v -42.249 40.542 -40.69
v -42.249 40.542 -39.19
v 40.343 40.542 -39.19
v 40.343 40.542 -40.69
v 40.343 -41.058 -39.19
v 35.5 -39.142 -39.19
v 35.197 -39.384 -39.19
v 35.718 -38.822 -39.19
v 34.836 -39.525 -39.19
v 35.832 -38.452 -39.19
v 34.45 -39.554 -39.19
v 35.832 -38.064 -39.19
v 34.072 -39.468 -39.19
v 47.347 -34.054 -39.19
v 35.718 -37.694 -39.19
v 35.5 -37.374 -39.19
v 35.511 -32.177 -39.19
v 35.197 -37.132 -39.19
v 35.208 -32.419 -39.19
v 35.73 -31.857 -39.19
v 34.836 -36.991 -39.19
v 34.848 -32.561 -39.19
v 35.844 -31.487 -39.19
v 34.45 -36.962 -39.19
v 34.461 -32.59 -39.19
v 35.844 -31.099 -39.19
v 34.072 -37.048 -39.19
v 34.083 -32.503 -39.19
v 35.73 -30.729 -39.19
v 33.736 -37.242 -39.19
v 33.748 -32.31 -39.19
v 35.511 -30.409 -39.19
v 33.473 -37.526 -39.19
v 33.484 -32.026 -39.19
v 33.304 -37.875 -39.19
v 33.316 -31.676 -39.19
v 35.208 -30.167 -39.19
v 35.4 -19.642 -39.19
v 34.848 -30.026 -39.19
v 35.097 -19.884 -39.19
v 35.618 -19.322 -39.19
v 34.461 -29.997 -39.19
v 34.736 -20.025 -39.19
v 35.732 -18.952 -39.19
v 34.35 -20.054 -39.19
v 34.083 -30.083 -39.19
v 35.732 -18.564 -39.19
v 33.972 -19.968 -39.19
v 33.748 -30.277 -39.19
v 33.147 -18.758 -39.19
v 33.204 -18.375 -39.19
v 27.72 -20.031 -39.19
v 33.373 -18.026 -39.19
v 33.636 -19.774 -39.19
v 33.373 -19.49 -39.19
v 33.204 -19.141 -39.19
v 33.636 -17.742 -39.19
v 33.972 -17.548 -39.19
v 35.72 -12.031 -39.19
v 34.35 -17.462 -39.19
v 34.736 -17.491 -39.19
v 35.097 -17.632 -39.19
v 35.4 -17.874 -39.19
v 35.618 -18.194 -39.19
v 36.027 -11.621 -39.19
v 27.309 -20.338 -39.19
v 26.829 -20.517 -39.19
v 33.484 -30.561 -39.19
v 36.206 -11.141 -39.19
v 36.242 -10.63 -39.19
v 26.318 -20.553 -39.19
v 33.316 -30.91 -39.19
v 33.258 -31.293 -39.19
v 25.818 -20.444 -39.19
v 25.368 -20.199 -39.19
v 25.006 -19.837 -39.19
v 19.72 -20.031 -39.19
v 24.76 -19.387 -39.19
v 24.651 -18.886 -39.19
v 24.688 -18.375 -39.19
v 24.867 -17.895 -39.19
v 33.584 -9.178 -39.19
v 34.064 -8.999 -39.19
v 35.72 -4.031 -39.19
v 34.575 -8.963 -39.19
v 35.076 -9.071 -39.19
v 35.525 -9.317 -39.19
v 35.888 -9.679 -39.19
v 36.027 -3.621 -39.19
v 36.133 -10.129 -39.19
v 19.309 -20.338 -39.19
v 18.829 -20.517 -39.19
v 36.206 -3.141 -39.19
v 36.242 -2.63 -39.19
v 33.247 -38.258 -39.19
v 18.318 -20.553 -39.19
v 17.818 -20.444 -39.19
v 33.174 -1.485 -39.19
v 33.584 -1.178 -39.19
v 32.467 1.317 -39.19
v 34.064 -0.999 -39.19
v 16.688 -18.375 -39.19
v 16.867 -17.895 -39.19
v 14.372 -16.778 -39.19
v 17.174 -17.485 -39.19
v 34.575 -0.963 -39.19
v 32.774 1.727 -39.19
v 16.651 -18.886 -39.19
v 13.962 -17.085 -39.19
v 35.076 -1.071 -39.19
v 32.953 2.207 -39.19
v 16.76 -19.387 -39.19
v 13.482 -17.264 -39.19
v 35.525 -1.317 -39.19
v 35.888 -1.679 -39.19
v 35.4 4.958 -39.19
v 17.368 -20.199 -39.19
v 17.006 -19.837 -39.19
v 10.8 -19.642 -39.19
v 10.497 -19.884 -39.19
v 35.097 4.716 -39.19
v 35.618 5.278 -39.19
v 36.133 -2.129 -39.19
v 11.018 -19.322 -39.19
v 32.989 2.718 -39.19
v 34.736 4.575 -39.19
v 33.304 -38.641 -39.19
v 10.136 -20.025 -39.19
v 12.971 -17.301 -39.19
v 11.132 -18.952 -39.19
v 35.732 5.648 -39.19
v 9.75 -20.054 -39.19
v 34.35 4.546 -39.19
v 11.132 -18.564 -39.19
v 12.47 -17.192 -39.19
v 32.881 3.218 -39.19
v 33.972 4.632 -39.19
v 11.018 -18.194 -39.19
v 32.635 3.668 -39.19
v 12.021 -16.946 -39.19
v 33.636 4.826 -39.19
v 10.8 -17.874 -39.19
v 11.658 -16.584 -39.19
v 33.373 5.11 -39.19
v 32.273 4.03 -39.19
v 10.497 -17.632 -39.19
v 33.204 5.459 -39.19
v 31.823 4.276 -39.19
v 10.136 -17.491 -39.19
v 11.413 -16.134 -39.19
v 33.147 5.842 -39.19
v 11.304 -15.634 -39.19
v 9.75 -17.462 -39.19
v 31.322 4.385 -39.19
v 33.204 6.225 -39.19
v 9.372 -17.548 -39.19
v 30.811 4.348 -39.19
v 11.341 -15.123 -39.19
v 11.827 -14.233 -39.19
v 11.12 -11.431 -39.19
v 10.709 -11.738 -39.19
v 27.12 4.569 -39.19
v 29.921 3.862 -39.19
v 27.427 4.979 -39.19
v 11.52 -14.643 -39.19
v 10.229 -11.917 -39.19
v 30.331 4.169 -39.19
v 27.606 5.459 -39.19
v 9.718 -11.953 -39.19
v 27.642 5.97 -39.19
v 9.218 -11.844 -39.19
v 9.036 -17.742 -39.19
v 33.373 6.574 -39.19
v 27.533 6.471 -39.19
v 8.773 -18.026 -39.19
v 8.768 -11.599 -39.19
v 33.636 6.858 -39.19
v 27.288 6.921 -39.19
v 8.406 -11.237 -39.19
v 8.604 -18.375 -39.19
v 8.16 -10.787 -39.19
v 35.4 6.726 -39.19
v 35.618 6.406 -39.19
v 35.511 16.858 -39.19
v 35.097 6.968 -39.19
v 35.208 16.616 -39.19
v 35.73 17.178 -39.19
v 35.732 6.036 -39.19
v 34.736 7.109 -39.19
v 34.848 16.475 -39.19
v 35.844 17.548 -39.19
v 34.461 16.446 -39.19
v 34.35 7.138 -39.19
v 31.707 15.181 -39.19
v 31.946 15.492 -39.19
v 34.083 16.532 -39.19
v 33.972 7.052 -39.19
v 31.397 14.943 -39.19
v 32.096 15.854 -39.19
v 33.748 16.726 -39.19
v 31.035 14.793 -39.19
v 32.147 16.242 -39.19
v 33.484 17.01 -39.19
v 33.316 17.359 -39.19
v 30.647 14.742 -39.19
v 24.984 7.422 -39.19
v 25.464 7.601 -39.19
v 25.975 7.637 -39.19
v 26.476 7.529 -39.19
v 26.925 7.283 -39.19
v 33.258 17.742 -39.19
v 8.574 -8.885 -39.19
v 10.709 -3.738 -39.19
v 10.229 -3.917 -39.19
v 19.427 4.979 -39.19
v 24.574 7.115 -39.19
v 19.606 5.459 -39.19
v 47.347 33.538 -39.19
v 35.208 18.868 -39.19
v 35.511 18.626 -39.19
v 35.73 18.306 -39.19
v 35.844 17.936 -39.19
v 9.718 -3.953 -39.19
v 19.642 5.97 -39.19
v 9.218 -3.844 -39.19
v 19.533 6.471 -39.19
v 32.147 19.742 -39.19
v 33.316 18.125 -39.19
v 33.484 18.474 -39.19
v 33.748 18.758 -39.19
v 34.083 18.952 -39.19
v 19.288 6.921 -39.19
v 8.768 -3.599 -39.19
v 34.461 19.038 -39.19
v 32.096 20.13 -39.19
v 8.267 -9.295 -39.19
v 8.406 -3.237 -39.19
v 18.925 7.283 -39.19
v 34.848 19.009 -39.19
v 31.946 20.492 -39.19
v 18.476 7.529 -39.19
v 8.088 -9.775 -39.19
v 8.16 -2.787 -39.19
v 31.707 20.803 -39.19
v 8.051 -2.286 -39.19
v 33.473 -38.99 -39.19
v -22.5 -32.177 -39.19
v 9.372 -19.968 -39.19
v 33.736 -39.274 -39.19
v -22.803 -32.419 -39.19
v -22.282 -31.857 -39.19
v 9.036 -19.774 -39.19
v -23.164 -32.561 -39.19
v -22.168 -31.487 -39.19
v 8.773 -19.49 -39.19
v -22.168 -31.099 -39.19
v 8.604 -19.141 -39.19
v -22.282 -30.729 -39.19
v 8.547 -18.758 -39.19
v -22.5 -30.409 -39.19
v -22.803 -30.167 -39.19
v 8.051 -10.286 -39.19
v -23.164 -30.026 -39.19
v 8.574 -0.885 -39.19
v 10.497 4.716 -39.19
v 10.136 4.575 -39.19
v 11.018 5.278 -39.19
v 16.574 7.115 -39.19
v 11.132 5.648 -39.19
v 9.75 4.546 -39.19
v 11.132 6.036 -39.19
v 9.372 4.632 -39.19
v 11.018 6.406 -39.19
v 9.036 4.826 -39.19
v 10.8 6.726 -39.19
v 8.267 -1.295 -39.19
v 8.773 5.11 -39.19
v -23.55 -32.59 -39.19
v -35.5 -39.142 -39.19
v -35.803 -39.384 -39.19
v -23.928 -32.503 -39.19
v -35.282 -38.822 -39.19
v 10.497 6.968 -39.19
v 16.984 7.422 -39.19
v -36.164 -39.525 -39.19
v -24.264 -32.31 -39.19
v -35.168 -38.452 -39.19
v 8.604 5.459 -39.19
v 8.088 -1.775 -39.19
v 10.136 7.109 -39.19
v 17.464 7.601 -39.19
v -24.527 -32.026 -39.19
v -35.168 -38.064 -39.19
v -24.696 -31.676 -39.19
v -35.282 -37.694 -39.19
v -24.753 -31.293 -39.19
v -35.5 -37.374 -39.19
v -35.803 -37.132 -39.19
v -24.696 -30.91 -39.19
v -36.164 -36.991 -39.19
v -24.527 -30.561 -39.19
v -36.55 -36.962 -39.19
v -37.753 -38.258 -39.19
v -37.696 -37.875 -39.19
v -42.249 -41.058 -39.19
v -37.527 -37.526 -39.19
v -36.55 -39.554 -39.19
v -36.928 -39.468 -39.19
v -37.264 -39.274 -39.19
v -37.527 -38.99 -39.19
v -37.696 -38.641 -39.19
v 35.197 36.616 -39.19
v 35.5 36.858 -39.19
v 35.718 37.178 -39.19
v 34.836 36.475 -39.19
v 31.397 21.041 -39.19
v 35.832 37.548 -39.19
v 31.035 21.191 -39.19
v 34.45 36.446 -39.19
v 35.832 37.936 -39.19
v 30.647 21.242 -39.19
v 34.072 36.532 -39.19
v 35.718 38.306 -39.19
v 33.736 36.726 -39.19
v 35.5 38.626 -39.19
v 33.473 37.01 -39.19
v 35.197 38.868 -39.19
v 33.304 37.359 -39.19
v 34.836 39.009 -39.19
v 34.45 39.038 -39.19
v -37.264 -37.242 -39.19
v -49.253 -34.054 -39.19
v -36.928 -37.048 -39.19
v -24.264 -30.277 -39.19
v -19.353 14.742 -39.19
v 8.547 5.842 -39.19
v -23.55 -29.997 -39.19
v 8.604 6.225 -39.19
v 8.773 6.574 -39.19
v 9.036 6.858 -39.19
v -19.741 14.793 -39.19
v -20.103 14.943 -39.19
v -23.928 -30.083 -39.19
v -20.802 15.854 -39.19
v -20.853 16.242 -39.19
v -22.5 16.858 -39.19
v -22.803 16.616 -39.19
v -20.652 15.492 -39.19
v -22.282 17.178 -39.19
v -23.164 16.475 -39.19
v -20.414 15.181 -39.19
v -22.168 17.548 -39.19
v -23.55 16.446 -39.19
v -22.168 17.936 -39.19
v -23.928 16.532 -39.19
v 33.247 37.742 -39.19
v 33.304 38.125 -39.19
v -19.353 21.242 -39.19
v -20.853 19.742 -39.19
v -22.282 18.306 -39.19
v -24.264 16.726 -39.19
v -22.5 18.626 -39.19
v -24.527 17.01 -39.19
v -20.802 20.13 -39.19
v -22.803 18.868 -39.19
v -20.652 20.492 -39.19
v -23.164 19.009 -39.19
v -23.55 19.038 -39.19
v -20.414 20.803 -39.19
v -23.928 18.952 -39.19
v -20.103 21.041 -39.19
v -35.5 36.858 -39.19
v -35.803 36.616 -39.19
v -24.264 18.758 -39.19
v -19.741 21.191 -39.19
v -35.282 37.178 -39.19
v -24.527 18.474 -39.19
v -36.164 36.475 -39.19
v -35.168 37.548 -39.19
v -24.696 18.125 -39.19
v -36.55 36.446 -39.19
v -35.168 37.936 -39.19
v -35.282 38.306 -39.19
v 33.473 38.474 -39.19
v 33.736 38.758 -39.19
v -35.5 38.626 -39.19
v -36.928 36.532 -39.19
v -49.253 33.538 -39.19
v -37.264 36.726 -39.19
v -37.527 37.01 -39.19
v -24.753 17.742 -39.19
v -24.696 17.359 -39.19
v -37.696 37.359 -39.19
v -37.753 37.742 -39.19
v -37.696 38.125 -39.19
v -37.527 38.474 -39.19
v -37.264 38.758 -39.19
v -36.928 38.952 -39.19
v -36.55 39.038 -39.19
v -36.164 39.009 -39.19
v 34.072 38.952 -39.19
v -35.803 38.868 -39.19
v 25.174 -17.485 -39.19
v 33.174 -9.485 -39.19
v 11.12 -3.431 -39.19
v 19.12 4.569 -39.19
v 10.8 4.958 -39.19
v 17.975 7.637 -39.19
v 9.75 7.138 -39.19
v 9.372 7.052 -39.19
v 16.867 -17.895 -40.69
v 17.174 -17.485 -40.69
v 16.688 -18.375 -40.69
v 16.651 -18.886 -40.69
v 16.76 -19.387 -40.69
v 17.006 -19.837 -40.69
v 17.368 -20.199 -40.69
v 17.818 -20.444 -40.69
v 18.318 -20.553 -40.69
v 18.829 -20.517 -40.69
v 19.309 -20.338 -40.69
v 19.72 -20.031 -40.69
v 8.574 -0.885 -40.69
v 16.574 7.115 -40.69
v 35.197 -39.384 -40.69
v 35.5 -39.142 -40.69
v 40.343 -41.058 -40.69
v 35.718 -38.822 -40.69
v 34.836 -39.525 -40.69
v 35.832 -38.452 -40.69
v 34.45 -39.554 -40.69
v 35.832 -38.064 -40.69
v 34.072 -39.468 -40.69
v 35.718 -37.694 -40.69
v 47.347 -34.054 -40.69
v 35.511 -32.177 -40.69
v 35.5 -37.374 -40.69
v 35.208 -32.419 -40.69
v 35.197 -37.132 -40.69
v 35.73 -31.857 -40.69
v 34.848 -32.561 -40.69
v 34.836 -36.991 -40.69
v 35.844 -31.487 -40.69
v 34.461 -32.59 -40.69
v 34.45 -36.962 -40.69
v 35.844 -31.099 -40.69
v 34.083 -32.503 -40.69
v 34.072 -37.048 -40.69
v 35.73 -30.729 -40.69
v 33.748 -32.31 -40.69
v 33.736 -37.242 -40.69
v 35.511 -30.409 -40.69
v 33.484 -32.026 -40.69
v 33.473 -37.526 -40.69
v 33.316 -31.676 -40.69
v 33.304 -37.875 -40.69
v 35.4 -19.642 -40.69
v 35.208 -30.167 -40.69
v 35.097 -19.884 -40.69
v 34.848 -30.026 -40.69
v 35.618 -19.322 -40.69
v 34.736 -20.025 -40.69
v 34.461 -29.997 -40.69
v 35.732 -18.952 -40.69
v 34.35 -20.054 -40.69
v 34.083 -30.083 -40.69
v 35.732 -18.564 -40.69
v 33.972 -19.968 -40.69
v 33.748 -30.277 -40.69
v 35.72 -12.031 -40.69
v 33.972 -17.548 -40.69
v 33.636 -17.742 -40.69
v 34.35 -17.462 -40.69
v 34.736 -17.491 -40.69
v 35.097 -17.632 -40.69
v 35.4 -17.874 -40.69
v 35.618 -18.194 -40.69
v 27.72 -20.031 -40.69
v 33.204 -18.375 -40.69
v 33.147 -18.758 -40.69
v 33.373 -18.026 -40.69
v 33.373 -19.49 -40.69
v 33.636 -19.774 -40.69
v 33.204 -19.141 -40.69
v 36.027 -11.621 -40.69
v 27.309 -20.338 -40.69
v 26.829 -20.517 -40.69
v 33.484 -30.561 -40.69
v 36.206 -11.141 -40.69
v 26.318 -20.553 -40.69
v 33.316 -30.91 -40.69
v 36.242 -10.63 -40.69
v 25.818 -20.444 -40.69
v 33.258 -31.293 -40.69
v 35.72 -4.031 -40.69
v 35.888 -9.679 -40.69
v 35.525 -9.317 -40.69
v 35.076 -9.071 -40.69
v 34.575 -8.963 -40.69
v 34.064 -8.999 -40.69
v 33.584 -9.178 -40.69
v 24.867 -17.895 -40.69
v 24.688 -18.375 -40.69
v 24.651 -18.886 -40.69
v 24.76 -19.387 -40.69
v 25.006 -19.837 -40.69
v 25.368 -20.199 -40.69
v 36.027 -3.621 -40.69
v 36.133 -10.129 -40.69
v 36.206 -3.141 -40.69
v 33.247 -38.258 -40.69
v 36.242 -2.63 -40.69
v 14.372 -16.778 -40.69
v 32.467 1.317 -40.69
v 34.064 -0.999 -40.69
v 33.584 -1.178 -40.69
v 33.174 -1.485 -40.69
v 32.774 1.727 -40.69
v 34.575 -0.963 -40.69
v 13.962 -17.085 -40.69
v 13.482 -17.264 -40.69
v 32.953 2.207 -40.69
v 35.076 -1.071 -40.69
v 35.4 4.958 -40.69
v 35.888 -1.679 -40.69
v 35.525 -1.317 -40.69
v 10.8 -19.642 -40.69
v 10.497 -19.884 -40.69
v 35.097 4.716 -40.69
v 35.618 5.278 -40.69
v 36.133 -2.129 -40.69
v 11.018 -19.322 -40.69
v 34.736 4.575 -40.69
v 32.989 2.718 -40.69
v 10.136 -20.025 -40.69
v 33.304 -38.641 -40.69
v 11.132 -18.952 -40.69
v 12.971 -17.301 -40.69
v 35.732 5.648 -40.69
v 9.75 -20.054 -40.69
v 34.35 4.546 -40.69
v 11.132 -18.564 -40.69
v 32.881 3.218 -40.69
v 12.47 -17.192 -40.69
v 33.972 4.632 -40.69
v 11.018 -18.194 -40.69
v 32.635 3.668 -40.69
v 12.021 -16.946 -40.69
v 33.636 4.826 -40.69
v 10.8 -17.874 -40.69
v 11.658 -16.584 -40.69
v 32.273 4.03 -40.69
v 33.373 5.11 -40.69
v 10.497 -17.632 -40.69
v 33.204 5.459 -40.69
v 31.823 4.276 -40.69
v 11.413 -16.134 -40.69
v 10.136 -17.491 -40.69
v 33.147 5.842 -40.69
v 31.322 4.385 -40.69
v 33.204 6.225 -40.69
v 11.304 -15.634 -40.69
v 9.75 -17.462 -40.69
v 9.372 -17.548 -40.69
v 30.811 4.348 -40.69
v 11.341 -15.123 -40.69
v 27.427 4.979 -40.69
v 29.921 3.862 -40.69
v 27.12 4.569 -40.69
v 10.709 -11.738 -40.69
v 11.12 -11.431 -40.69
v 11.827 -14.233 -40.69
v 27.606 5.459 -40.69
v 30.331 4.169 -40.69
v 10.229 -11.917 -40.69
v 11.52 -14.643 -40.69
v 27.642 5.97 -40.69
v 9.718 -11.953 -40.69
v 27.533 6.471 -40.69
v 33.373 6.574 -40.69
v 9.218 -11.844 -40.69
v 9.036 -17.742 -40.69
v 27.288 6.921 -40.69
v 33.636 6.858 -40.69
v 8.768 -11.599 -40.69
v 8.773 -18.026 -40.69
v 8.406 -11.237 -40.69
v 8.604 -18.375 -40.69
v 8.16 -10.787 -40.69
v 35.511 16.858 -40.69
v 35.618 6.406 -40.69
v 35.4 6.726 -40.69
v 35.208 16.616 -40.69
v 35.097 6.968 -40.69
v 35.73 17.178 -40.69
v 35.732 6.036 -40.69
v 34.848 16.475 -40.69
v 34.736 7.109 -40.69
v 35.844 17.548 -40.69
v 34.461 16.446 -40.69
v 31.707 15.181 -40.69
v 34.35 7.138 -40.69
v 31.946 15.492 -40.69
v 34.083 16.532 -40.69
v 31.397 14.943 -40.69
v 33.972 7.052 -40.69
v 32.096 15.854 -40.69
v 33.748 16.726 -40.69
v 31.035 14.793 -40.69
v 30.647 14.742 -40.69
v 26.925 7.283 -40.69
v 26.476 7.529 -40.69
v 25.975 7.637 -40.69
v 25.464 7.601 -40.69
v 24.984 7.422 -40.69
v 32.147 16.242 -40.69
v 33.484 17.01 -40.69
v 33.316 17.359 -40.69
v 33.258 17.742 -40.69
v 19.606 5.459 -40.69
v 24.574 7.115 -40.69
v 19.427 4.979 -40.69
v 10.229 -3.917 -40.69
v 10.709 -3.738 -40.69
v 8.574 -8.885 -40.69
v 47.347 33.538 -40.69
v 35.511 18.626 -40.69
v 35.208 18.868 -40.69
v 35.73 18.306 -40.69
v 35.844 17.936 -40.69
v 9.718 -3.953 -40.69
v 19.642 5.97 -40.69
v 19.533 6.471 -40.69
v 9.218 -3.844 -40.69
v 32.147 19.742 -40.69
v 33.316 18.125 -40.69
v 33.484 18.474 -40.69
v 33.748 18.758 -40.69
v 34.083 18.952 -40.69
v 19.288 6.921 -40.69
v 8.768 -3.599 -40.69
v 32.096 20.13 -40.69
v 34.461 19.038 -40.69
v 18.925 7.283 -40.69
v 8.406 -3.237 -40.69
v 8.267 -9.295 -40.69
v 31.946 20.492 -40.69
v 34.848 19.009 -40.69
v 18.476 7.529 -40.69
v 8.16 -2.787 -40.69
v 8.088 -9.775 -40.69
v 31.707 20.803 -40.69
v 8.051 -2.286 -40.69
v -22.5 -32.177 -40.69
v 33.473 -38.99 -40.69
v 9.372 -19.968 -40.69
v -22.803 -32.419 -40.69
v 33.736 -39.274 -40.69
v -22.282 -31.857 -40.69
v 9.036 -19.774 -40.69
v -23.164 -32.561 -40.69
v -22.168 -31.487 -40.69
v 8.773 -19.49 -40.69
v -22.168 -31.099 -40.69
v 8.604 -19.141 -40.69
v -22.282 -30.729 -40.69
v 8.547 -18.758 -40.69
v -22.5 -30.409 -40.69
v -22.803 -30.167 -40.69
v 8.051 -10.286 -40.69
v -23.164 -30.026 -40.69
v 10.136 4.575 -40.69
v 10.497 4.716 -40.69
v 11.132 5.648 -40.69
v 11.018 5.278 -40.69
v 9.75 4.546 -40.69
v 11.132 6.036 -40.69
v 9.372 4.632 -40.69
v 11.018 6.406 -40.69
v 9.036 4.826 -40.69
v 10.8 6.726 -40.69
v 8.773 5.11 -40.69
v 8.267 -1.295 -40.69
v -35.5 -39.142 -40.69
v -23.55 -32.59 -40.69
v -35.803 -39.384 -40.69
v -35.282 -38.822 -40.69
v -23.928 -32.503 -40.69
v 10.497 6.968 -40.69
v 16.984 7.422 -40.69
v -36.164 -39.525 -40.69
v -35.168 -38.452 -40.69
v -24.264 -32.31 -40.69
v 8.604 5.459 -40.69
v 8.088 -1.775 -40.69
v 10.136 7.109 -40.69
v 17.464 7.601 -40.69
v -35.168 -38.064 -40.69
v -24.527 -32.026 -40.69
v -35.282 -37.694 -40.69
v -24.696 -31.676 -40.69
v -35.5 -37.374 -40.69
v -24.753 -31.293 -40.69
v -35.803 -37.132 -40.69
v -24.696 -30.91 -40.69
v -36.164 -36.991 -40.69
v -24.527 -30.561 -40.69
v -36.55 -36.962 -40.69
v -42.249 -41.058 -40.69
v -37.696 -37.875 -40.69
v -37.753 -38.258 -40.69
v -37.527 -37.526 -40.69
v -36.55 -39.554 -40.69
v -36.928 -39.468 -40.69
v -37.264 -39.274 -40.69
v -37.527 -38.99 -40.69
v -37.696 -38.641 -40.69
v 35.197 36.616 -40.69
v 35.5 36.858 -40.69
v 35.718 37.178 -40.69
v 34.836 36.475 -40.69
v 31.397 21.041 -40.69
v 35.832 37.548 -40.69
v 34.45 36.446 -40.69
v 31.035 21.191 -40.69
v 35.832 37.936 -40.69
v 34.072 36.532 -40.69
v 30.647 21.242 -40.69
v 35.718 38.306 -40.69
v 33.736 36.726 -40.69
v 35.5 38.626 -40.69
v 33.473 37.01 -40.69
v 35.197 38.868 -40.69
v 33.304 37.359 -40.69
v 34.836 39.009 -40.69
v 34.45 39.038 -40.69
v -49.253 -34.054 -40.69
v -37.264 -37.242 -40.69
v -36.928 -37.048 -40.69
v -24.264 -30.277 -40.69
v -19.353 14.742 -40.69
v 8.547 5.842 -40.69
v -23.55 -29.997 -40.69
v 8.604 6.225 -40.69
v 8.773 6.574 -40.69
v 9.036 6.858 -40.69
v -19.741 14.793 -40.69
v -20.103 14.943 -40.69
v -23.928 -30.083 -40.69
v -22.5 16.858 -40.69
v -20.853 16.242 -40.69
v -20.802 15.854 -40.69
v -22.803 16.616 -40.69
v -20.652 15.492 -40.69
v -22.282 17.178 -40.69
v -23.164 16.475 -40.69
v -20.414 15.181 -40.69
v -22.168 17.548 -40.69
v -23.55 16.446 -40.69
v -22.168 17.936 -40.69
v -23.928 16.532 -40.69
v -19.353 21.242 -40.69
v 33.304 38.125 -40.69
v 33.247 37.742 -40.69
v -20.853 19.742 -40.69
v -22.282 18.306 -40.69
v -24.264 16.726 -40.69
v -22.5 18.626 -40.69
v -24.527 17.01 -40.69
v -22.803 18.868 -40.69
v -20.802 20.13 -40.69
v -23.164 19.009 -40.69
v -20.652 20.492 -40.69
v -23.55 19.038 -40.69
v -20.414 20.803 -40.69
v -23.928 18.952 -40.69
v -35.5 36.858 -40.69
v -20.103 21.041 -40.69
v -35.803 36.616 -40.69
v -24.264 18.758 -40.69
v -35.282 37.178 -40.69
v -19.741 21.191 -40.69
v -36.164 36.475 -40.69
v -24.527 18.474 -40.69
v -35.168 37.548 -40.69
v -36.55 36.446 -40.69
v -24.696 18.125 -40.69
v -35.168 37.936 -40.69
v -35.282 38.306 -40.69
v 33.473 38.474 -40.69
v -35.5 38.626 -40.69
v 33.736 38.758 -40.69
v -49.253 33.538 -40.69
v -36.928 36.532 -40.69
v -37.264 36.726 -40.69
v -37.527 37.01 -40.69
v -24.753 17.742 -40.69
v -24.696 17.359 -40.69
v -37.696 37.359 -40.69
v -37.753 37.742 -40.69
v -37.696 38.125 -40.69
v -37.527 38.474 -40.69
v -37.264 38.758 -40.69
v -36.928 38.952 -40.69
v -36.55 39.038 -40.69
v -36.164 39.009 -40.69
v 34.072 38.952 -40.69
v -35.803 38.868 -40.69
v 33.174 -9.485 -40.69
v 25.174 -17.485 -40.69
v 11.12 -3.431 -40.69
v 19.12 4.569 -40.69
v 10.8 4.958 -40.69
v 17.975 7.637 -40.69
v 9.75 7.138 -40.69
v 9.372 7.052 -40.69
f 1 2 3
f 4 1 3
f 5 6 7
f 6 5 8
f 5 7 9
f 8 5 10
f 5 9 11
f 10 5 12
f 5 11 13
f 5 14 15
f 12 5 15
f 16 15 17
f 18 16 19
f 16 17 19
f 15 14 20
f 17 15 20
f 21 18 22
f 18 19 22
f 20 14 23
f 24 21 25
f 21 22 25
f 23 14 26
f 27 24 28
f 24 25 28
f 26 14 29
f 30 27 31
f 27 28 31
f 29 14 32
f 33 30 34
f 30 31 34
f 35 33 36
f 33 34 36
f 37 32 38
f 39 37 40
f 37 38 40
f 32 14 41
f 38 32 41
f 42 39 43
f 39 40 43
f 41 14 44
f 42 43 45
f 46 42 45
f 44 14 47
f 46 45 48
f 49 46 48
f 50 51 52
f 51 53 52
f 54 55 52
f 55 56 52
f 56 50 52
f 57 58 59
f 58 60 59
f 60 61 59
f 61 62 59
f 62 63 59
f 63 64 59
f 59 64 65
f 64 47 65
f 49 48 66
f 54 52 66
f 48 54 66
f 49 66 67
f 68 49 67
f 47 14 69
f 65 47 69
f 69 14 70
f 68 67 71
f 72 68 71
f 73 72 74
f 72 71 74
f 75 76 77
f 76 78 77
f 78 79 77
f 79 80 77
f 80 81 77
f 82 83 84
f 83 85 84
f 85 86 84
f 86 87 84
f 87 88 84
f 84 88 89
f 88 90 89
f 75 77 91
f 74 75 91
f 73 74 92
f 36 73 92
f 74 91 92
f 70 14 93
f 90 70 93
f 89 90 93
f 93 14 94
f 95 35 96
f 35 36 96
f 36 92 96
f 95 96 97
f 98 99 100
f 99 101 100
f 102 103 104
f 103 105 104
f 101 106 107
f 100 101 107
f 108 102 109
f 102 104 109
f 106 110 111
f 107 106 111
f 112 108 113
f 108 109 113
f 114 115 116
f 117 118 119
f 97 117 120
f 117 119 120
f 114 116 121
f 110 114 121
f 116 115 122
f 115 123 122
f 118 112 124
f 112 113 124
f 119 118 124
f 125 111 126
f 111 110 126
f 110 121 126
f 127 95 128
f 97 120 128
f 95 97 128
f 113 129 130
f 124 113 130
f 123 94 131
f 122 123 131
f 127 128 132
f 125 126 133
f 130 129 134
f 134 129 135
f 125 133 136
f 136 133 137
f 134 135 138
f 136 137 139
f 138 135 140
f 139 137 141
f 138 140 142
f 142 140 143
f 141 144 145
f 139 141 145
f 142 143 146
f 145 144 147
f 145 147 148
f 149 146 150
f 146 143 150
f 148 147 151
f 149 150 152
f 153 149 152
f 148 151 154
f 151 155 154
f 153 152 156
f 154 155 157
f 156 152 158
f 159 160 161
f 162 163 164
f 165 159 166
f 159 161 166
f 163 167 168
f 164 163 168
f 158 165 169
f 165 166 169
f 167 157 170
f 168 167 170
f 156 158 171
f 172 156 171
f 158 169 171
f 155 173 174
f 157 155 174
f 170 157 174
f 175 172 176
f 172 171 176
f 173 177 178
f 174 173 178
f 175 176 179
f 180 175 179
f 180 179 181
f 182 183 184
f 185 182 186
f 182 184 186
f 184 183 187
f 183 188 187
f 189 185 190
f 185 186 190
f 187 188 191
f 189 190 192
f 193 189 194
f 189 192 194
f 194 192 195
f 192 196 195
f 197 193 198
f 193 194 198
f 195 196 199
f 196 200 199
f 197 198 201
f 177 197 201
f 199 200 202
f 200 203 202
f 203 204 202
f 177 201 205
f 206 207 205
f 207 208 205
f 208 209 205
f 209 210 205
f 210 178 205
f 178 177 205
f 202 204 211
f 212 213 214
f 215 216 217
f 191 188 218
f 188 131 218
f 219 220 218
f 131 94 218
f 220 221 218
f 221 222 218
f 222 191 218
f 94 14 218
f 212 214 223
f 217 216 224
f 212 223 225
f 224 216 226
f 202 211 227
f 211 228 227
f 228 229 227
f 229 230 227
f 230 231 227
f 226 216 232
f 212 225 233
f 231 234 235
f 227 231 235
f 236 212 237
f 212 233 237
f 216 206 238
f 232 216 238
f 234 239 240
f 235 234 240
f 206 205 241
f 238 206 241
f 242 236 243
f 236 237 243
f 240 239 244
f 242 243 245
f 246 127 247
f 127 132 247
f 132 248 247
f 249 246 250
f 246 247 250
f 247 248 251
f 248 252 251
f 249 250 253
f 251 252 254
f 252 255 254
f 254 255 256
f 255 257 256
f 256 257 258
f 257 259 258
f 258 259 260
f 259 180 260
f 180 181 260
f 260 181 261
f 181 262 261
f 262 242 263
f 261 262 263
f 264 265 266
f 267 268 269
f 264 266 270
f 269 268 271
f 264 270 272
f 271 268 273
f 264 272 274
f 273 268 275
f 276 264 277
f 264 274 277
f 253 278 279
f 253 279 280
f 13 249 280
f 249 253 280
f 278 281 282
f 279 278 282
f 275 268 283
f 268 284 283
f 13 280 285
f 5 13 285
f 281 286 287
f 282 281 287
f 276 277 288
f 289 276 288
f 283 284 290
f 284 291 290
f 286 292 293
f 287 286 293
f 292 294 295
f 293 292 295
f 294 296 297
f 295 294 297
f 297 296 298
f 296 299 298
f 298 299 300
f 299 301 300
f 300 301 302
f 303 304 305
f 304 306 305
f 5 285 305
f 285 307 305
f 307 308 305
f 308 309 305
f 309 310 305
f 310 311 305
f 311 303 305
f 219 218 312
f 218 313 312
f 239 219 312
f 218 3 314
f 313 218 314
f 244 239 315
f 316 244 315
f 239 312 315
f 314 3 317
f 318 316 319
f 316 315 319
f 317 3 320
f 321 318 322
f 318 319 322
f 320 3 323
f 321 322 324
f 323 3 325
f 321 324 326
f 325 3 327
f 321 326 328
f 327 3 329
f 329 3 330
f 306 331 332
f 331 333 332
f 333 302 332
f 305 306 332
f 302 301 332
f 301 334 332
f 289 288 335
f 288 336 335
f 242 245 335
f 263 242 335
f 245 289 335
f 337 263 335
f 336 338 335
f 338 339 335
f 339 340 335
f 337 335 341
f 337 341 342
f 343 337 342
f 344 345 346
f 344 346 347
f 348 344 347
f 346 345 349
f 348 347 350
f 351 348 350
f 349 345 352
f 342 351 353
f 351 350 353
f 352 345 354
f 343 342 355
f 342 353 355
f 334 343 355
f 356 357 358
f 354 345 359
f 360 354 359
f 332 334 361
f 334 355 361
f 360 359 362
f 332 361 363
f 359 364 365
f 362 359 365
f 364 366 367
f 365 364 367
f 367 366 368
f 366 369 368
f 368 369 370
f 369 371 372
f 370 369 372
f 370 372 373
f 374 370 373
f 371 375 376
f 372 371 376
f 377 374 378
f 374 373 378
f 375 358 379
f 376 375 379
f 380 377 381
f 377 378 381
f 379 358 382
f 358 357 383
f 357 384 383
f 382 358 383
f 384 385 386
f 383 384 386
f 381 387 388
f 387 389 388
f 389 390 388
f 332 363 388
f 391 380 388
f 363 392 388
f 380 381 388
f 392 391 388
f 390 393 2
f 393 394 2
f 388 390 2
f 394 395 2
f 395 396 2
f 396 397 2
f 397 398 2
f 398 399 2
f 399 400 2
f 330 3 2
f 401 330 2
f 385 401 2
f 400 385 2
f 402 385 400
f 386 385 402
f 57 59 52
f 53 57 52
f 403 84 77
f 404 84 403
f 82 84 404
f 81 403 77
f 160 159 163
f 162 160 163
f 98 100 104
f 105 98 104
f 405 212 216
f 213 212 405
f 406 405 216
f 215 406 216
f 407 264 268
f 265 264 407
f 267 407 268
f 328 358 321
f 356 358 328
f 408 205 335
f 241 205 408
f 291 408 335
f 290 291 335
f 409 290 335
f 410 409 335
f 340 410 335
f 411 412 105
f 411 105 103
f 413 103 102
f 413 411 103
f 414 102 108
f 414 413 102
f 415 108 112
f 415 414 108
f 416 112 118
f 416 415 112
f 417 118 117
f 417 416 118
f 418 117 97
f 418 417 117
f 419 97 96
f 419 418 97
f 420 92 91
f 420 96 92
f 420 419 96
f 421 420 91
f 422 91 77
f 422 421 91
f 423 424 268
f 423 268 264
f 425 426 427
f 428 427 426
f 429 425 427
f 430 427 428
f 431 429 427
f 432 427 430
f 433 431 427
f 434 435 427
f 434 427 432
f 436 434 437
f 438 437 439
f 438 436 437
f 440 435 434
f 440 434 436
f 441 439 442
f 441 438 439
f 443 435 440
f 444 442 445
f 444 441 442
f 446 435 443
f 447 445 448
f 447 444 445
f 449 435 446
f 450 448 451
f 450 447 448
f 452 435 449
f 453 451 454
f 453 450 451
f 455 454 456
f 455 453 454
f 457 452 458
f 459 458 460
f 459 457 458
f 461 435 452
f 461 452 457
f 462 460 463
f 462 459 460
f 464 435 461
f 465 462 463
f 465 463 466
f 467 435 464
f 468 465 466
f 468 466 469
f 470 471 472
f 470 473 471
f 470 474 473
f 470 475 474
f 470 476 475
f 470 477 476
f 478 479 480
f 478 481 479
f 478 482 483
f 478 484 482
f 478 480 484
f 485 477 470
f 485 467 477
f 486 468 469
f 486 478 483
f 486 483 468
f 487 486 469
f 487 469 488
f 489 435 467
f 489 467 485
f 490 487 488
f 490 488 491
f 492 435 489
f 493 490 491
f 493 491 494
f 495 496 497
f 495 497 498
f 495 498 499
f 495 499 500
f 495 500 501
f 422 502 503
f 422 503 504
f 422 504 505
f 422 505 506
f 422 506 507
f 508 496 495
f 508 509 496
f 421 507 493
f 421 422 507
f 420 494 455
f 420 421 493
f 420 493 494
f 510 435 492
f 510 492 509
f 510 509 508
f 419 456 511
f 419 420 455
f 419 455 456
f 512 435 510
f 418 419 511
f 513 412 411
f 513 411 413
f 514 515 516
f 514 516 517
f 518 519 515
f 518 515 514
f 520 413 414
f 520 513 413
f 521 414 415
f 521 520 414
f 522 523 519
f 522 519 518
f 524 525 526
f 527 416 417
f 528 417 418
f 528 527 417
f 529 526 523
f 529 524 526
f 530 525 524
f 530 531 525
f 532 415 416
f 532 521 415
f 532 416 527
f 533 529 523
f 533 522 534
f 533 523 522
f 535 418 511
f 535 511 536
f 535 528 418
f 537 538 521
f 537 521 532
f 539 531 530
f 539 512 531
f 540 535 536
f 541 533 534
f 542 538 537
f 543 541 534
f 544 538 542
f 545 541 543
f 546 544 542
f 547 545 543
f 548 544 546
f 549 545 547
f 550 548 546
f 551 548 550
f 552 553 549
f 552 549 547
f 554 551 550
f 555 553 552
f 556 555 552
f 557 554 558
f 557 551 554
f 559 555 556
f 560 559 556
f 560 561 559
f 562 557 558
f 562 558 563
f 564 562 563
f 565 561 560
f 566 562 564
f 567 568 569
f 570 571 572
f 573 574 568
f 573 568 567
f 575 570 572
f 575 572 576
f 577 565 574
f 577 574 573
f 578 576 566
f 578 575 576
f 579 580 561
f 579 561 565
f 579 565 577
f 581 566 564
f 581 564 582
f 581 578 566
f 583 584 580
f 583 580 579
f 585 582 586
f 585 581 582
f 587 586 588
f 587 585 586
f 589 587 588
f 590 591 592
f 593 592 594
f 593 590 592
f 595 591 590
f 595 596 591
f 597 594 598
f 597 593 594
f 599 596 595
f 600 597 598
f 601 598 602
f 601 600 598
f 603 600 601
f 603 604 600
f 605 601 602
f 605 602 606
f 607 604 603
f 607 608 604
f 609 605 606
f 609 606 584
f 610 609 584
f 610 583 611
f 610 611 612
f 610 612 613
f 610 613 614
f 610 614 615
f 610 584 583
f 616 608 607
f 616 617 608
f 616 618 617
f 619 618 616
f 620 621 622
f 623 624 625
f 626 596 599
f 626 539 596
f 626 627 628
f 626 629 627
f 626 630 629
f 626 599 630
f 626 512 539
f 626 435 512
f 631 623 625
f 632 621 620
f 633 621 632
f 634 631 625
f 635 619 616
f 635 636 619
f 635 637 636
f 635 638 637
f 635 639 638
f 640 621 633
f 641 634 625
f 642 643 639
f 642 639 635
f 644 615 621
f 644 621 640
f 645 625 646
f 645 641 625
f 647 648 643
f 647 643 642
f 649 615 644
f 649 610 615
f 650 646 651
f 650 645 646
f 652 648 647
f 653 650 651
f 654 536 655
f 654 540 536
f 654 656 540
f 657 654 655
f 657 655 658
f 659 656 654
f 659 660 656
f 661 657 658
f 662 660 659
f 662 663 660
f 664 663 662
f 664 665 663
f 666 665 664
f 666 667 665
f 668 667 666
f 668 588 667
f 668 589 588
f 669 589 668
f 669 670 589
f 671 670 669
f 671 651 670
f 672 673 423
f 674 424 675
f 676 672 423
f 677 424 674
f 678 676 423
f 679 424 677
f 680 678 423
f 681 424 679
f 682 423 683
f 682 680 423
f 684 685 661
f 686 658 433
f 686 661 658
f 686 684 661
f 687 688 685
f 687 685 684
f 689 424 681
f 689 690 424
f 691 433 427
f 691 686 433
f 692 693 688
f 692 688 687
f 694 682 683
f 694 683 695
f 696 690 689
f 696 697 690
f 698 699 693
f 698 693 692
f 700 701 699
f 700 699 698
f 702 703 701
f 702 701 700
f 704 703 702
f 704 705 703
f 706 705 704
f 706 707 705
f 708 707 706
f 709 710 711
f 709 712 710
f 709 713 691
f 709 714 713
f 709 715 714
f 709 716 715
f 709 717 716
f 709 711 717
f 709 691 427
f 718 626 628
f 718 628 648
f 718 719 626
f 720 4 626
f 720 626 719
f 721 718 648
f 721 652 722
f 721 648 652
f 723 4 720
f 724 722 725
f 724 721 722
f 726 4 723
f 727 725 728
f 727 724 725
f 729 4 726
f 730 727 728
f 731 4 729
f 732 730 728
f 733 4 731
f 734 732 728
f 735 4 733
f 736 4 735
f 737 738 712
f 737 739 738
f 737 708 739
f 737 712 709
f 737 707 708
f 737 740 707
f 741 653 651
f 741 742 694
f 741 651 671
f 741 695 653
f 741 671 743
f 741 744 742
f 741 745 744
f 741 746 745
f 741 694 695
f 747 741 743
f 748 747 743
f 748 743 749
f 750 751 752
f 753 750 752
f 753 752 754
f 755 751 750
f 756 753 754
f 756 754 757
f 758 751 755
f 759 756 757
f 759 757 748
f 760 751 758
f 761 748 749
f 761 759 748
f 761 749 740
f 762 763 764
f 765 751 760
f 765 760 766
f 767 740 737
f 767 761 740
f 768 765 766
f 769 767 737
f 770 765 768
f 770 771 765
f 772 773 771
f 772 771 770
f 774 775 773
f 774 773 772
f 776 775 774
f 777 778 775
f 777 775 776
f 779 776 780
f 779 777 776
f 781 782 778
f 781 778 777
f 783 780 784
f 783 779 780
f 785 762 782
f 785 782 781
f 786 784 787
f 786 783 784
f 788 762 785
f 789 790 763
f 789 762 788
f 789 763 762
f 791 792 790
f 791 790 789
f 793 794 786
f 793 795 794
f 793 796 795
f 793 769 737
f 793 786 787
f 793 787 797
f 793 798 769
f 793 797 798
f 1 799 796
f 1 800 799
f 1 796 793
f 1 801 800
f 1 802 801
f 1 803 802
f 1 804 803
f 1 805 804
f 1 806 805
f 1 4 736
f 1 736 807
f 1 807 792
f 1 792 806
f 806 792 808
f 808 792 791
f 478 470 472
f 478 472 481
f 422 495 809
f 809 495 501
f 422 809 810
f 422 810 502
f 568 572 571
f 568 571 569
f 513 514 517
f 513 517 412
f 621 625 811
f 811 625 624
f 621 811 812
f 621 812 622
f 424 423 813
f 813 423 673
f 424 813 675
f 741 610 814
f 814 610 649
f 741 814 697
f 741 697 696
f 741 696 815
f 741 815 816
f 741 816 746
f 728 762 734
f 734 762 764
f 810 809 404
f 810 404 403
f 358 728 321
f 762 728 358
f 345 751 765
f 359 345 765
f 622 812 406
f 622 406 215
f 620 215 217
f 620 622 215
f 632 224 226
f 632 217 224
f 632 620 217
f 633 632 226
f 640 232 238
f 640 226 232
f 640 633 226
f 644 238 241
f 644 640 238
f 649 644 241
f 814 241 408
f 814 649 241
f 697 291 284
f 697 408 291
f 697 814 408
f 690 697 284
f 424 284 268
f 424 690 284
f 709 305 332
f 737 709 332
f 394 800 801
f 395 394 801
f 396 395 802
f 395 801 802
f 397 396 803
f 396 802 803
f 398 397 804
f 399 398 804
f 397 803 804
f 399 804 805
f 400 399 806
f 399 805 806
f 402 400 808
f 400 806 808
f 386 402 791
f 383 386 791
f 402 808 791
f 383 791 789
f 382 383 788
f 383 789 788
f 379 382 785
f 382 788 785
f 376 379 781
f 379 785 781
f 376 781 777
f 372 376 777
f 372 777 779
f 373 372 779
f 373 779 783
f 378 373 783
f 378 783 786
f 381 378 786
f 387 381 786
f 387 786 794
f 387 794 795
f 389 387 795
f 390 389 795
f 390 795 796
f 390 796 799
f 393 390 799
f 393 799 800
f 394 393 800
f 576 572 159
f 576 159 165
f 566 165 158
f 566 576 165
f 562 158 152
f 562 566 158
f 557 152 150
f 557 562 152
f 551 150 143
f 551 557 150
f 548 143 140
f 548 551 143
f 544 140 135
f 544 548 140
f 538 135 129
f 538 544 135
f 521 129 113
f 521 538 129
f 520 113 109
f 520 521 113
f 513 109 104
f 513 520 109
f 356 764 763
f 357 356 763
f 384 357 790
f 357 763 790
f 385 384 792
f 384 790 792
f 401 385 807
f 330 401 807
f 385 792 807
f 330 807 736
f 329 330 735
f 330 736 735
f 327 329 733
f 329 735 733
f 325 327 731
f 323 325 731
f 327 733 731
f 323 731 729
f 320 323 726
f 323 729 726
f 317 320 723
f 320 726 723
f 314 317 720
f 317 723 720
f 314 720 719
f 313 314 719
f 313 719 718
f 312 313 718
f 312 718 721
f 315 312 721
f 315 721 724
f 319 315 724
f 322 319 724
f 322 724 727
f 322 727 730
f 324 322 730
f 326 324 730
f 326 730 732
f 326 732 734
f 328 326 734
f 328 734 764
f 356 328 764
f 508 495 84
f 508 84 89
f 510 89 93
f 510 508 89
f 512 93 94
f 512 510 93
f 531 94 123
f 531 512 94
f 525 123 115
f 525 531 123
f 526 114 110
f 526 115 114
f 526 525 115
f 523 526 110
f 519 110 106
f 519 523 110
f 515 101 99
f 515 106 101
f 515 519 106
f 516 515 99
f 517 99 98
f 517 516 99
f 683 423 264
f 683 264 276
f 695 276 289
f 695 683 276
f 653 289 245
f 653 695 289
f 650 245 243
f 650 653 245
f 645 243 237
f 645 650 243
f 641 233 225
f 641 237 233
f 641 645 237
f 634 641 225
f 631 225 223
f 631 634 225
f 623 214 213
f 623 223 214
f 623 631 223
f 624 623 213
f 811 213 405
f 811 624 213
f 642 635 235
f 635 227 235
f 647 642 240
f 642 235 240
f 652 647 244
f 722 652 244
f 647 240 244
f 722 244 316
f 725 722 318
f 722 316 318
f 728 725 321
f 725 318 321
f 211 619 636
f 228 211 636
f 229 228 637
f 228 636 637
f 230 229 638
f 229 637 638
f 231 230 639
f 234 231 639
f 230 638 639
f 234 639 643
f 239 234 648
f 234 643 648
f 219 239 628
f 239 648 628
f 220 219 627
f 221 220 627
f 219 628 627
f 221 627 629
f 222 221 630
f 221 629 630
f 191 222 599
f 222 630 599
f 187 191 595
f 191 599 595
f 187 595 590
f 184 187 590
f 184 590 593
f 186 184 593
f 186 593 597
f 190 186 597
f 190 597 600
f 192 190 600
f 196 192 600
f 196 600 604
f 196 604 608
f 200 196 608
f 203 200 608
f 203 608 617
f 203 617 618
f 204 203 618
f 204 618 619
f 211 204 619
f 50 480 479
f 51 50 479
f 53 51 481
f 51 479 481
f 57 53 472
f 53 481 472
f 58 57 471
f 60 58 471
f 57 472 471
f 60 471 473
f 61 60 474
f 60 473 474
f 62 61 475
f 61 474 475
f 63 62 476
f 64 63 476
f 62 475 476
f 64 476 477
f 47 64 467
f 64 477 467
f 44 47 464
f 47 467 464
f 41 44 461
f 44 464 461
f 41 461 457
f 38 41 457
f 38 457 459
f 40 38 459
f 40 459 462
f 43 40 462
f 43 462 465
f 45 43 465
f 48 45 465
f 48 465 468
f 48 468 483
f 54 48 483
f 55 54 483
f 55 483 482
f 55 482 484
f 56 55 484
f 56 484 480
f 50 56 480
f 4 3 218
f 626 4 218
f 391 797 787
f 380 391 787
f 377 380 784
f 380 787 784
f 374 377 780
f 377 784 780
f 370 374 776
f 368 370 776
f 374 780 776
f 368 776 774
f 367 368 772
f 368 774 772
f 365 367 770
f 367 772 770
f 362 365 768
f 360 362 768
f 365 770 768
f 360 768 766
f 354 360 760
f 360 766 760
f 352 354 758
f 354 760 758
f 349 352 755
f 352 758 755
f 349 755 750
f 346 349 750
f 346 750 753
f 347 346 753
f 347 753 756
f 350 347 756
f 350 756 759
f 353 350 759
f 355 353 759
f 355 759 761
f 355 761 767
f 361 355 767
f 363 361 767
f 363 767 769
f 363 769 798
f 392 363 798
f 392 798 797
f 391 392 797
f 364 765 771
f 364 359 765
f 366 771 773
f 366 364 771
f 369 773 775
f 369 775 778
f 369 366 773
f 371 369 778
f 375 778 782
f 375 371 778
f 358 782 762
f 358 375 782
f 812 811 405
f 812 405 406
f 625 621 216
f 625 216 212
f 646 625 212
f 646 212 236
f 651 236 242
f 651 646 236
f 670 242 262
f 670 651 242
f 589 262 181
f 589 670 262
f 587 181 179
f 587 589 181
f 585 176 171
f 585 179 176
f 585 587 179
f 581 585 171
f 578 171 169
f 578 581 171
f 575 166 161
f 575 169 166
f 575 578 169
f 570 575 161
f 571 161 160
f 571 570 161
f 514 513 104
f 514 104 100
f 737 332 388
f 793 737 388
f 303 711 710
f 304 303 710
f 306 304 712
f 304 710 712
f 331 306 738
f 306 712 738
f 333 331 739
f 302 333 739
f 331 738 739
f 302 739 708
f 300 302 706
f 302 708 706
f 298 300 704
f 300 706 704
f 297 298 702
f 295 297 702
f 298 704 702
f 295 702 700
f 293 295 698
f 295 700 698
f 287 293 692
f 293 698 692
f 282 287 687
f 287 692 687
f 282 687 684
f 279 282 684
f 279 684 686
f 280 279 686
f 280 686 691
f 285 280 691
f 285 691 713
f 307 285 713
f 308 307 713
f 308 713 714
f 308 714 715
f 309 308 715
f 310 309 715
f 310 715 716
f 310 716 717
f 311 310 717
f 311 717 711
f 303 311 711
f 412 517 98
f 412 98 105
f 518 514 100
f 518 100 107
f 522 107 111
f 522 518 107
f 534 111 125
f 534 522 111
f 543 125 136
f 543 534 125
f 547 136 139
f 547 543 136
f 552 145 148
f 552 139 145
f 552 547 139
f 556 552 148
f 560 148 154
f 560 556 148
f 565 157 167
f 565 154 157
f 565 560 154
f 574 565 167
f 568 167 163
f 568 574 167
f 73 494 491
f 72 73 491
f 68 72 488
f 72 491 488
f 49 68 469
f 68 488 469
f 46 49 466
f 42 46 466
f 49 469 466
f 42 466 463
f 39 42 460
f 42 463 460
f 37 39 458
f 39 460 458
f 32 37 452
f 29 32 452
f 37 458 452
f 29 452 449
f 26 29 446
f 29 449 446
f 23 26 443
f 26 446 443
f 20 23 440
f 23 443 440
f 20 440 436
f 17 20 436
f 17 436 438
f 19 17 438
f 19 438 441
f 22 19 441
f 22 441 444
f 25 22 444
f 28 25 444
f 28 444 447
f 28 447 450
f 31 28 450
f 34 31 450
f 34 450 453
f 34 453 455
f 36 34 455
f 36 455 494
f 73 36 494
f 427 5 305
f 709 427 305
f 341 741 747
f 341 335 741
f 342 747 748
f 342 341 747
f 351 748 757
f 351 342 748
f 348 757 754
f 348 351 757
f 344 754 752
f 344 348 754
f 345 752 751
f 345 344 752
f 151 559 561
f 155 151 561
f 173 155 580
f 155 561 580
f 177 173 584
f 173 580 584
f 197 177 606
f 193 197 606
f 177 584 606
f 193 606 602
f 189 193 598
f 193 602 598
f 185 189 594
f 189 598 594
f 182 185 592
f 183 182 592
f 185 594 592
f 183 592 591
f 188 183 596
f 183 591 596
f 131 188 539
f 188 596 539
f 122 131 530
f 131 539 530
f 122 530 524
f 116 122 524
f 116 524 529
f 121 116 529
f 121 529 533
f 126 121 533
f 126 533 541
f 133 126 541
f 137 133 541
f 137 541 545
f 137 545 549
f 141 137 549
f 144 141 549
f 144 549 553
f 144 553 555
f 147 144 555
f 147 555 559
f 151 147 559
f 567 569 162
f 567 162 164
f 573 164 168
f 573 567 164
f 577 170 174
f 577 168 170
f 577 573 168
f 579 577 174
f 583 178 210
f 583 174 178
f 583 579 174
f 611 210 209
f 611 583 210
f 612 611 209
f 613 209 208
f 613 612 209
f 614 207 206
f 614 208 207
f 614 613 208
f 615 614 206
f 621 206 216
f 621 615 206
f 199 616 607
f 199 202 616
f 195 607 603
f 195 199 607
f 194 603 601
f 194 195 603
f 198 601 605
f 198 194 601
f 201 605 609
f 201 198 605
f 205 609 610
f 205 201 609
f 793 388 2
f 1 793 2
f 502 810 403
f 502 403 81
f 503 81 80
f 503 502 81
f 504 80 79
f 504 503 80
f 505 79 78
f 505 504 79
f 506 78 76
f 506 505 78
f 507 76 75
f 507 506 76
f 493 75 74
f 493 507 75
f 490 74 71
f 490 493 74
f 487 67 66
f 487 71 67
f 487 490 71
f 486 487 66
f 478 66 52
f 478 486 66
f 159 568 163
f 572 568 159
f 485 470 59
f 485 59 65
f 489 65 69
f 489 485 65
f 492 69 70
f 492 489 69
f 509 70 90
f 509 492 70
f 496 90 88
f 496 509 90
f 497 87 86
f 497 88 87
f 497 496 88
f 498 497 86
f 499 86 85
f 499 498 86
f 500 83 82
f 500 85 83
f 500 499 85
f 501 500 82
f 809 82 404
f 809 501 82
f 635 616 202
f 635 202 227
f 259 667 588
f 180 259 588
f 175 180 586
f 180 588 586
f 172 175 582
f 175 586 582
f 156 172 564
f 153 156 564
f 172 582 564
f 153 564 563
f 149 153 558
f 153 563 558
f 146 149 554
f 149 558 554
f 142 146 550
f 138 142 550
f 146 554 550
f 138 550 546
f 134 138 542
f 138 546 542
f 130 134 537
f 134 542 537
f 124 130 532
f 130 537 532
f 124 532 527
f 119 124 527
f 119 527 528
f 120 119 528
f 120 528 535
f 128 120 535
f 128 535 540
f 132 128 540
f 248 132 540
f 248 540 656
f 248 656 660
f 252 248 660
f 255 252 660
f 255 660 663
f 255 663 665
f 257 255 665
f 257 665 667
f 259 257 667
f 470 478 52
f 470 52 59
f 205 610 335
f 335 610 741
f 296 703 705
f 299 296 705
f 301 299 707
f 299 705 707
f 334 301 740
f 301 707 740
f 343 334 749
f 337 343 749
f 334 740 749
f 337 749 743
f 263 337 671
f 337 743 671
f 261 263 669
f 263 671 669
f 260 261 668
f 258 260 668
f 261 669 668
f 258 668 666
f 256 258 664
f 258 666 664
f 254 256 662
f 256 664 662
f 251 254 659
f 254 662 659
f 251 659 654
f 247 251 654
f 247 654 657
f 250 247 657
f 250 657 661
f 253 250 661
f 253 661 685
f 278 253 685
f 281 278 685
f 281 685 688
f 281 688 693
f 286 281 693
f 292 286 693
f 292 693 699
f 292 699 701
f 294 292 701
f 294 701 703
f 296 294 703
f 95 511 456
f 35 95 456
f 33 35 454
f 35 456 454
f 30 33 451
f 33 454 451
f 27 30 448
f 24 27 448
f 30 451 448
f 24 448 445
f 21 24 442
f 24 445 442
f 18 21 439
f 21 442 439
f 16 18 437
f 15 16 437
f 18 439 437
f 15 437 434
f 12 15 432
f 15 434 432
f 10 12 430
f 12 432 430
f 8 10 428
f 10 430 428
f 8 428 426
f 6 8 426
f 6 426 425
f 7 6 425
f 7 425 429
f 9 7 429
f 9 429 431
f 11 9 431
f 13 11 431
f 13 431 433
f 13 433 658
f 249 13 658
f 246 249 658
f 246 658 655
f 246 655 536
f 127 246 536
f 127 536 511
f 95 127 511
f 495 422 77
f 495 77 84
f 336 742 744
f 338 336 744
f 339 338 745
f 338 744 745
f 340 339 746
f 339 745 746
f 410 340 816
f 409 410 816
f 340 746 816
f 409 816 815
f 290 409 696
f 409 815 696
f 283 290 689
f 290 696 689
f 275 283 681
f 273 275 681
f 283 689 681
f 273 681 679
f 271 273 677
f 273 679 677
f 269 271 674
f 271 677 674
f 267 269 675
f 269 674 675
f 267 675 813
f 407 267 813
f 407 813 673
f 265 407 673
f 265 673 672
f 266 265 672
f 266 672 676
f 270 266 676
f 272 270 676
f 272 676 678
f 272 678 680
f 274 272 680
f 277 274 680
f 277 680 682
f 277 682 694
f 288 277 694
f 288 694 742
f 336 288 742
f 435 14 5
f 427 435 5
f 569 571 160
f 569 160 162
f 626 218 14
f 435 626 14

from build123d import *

# Parameters (mm, degrees)
EXTRUDE_1_DEPTH     = 1.5
SKETCH_3_R          = 1.3
CUT_EXTRUDE_1_DEPTH = 65.139634718
CUT_EXTRUDE_2_REACH = 66.14
SKETCH_4_R          = 1.3
CUT_EXTRUDE_3_REACH = 66.14
SKETCH_5_W          = 53
SKETCH_5_H          = 6.5
FILLET_1_R          = 1.5
CUT_EXTRUDE_4_REACH = 66.14
SKETCH_7_R          = 1.3
CUT_EXTRUDE_5_REACH = 66.14


with BuildPart() as part:
    # 草图2 → 凸台-拉伸1 (new body)
    with BuildSketch(Plane(origin=(0, 0, -39.19), x_dir=(-1, 0, 0), z_dir=(0, 0, -1))):
        Polygon((-47.34673203, -34.053824425), (-40.342568974, -41.057987481), (42.249104914, -41.057987481), (49.25326797, -34.053824425), (49.25326797, 33.537849463), (42.249104914, 40.542012519), (-40.342568974, 40.542012519), (-47.34673203, 33.537849463), align=None)
    extrude(amount=EXTRUDE_1_DEPTH)

    # 草图3 → 切除-拉伸1 (cut, through all)
    with BuildSketch(Plane(origin=(0, 0, -40.69), x_dir=(-1, 0, 0), z_dir=(0, 0, -1))):
        with Locations((-34.54673203, -38.257987481)):
            Circle(SKETCH_3_R)
        with Locations((36.45326797, -38.257987481)):
            Circle(SKETCH_3_R)
        with Locations((-34.54673203, 37.742012519)):
            Circle(SKETCH_3_R)
        with Locations((36.45326797, 37.742012519)):
            Circle(SKETCH_3_R)
    extrude(amount=-CUT_EXTRUDE_1_DEPTH, mode=Mode.SUBTRACT)

    # 草图4 → 切除-拉伸2 (cut, up to next)
    with BuildSketch(Plane(origin=(0, 0, -40.69), x_dir=(-1, 0, 0), z_dir=(0, 0, -1)), mode=Mode.PRIVATE) as cut_extrude_2_sk1:
        with Locations((23.45326797, -31.293200074)):
            Circle(SKETCH_4_R)
    cut_extrude_2_tool1 = extrude(cut_extrude_2_sk1.sketch, amount=-CUT_EXTRUDE_2_REACH, mode=Mode.PRIVATE) & part.part
    # 草图4 → 切除-拉伸2 (cut, up to next)
    with BuildSketch(Plane(origin=(0, 0, -40.69), x_dir=(-1, 0, 0), z_dir=(0, 0, -1)), mode=Mode.PRIVATE) as cut_extrude_2_sk2:
        with Locations((-34.558299802, -31.293200074)):
            Circle(SKETCH_4_R)
    cut_extrude_2_tool2 = extrude(cut_extrude_2_sk2.sketch, amount=-CUT_EXTRUDE_2_REACH, mode=Mode.PRIVATE) & part.part
    # 草图4 → 切除-拉伸2 (cut, up to next)
    with BuildSketch(Plane(origin=(0, 0, -40.69), x_dir=(-1, 0, 0), z_dir=(0, 0, -1)), mode=Mode.PRIVATE) as cut_extrude_2_sk3:
        with Locations((23.45326797, 17.742012519)):
            Circle(SKETCH_4_R)
    cut_extrude_2_tool3 = extrude(cut_extrude_2_sk3.sketch, amount=-CUT_EXTRUDE_2_REACH, mode=Mode.PRIVATE) & part.part
    # 草图4 → 切除-拉伸2 (cut, up to next)
    with BuildSketch(Plane(origin=(0, 0, -40.69), x_dir=(-1, 0, 0), z_dir=(0, 0, -1)), mode=Mode.PRIVATE) as cut_extrude_2_sk4:
        with Locations((-34.558299802, 17.742012519)):
            Circle(SKETCH_4_R)
    cut_extrude_2_tool4 = extrude(cut_extrude_2_sk4.sketch, amount=-CUT_EXTRUDE_2_REACH, mode=Mode.PRIVATE) & part.part
    add(cut_extrude_2_tool1.solids().sort_by_distance((-23.453268, -31.2932, -40.69))[0], mode=Mode.SUBTRACT)
    add(cut_extrude_2_tool2.solids().sort_by_distance((34.5583, -31.2932, -40.69))[0], mode=Mode.SUBTRACT)
    add(cut_extrude_2_tool3.solids().sort_by_distance((-23.453268, 17.742013, -40.69))[0], mode=Mode.SUBTRACT)
    add(cut_extrude_2_tool4.solids().sort_by_distance((34.5583, 17.742013, -40.69))[0], mode=Mode.SUBTRACT)

    # 草图5 → 切除-拉伸3 (cut, up to next)
    with BuildSketch(Plane(origin=(0, 0, -40.69), x_dir=(-1, 0, 0), z_dir=(0, 0, -1)), mode=Mode.PRIVATE) as cut_extrude_3_sk1:
        with Locations((-5.64673203, 17.992012519)):
            Rectangle(SKETCH_5_W, SKETCH_5_H)
    cut_extrude_3_tool1 = extrude(cut_extrude_3_sk1.sketch, amount=-CUT_EXTRUDE_3_REACH, mode=Mode.PRIVATE) & part.part
    add(cut_extrude_3_tool1.solids().sort_by_distance((5.646732, 17.992013, -40.69))[0], mode=Mode.SUBTRACT)

    # 圆角1
    fillet_1_edges = [part.edges().sort_by_distance(p)[0] for p in [
        (32.14673203, 14.742012519, -39.94),
        (32.14673203, 21.242012519, -39.94),
        (-20.85326797, 21.242012519, -39.94),
        (-20.85326797, 14.742012519, -39.94),
    ]]
    fillet(fillet_1_edges, radius=FILLET_1_R)

    # 草图7 → 切除-拉伸4 (cut, up to next)
    with BuildSketch(Plane(origin=(0, 0, -40.69), x_dir=(-1, 0, 0), z_dir=(0, 0, -1)), mode=Mode.PRIVATE) as cut_extrude_4_sk1:
        with Locations((-34.44673203, 5.842012519)):
            Circle(SKETCH_7_R)
    cut_extrude_4_tool1 = extrude(cut_extrude_4_sk1.sketch, amount=-CUT_EXTRUDE_4_REACH, mode=Mode.PRIVATE) & part.part
    # 草图7 → 切除-拉伸4 (cut, up to next)
    with BuildSketch(Plane(origin=(0, 0, -40.69), x_dir=(-1, 0, 0), z_dir=(0, 0, -1)), mode=Mode.PRIVATE) as cut_extrude_4_sk2:
        with Locations((-34.44673203, -18.757987481)):
            Circle(SKETCH_7_R)
    cut_extrude_4_tool2 = extrude(cut_extrude_4_sk2.sketch, amount=-CUT_EXTRUDE_4_REACH, mode=Mode.PRIVATE) & part.part
    # 草图7 → 切除-拉伸4 (cut, up to next)
    with BuildSketch(Plane(origin=(0, 0, -40.69), x_dir=(-1, 0, 0), z_dir=(0, 0, -1)), mode=Mode.PRIVATE) as cut_extrude_4_sk3:
        with Locations((-9.84673203, 5.842012519)):
            Circle(SKETCH_7_R)
    cut_extrude_4_tool3 = extrude(cut_extrude_4_sk3.sketch, amount=-CUT_EXTRUDE_4_REACH, mode=Mode.PRIVATE) & part.part
    # 草图7 → 切除-拉伸4 (cut, up to next)
    with BuildSketch(Plane(origin=(0, 0, -40.69), x_dir=(-1, 0, 0), z_dir=(0, 0, -1)), mode=Mode.PRIVATE) as cut_extrude_4_sk4:
        with Locations((-9.84673203, -18.757987481)):
            Circle(SKETCH_7_R)
    cut_extrude_4_tool4 = extrude(cut_extrude_4_sk4.sketch, amount=-CUT_EXTRUDE_4_REACH, mode=Mode.PRIVATE) & part.part
    add(cut_extrude_4_tool1.solids().sort_by_distance((34.446732, 5.842013, -40.69))[0], mode=Mode.SUBTRACT)
    add(cut_extrude_4_tool2.solids().sort_by_distance((34.446732, -18.757987, -40.69))[0], mode=Mode.SUBTRACT)
    add(cut_extrude_4_tool3.solids().sort_by_distance((9.846732, 5.842013, -40.69))[0], mode=Mode.SUBTRACT)
    add(cut_extrude_4_tool4.solids().sort_by_distance((9.846732, -18.757987, -40.69))[0], mode=Mode.SUBTRACT)

    # 草图8 → 切除-拉伸5 (cut, up to next)
    with BuildSketch(Plane(origin=(0, 0, -40.69), x_dir=(-1, 0, 0), z_dir=(0, 0, -1)), mode=Mode.PRIVATE) as cut_extrude_5_sk1:
        with BuildLine():
            Line((-29.92124863, 3.862113532), (-11.826631017, -14.232504081))
            ThreePointArc((-11.826631017, -14.232504081), (-11.826631017, -16.778088493), (-14.372215429, -16.778088493))
            Line((-14.372215429, -16.778088493), (-32.466833042, 1.31652912))
            ThreePointArc((-32.466833042, 1.31652912), (-32.466833042, 3.862113532), (-29.92124863, 3.862113532))
        make_face()
    cut_extrude_5_tool1 = extrude(cut_extrude_5_sk1.sketch, amount=-CUT_EXTRUDE_5_REACH, mode=Mode.PRIVATE) & part.part
    # 草图8 → 切除-拉伸5 (cut, up to next)
    with BuildSketch(Plane(origin=(0, 0, -40.69), x_dir=(-1, 0, 0), z_dir=(0, 0, -1)), mode=Mode.PRIVATE) as cut_extrude_5_sk2:
        with BuildLine():
            Line((-33.173939824, -1.485195275), (-17.173939824, -17.485195275))
            ThreePointArc((-17.173939824, -17.485195275), (-17.173939824, -20.030779687), (-19.719524236, -20.030779687))
            Line((-19.719524236, -20.030779687), (-35.719524236, -4.030779687))
            ThreePointArc((-35.719524236, -4.030779687), (-35.719524236, -1.485195275), (-33.173939824, -1.485195275))
        make_face()
    cut_extrude_5_tool2 = extrude(cut_extrude_5_sk2.sketch, amount=-CUT_EXTRUDE_5_REACH, mode=Mode.PRIVATE) & part.part
    # 草图8 → 切除-拉伸5 (cut, up to next)
    with BuildSketch(Plane(origin=(0, 0, -40.69), x_dir=(-1, 0, 0), z_dir=(0, 0, -1)), mode=Mode.PRIVATE) as cut_extrude_5_sk3:
        with BuildLine():
            Line((-24.573939824, 7.114804725), (-8.573939824, -8.885195275))
            ThreePointArc((-8.573939824, -8.885195275), (-8.573939824, -11.430779687), (-11.119524236, -11.430779687))
            Line((-11.119524236, -11.430779687), (-27.119524236, 4.569220313))
            ThreePointArc((-27.119524236, 4.569220313), (-27.119524236, 7.114804725), (-24.573939824, 7.114804725))
        make_face()
    cut_extrude_5_tool3 = extrude(cut_extrude_5_sk3.sketch, amount=-CUT_EXTRUDE_5_REACH, mode=Mode.PRIVATE) & part.part
    # 草图8 → 切除-拉伸5 (cut, up to next)
    with BuildSketch(Plane(origin=(0, 0, -40.69), x_dir=(-1, 0, 0), z_dir=(0, 0, -1)), mode=Mode.PRIVATE) as cut_extrude_5_sk4:
        with BuildLine():
            Line((-16.573939824, 7.114804725), (-8.573939824, -0.885195275))
            ThreePointArc((-8.573939824, -0.885195275), (-8.573939824, -3.430779687), (-11.119524236, -3.430779687))
            Line((-11.119524236, -3.430779687), (-19.119524236, 4.569220313))
            ThreePointArc((-19.119524236, 4.569220313), (-19.119524236, 7.114804725), (-16.573939824, 7.114804725))
        make_face()
    cut_extrude_5_tool4 = extrude(cut_extrude_5_sk4.sketch, amount=-CUT_EXTRUDE_5_REACH, mode=Mode.PRIVATE) & part.part
    # 草图8 → 切除-拉伸5 (cut, up to next)
    with BuildSketch(Plane(origin=(0, 0, -40.69), x_dir=(-1, 0, 0), z_dir=(0, 0, -1)), mode=Mode.PRIVATE) as cut_extrude_5_sk5:
        with BuildLine():
            Line((-33.173939824, -9.485195275), (-25.173939824, -17.485195275))
            ThreePointArc((-25.173939824, -17.485195275), (-25.173939824, -20.030779687), (-27.719524236, -20.030779687))
            Line((-27.719524236, -20.030779687), (-35.719524236, -12.030779687))
            ThreePointArc((-35.719524236, -12.030779687), (-35.719524236, -9.485195275), (-33.173939824, -9.485195275))
        make_face()
    cut_extrude_5_tool5 = extrude(cut_extrude_5_sk5.sketch, amount=-CUT_EXTRUDE_5_REACH, mode=Mode.PRIVATE) & part.part
    add(cut_extrude_5_tool1.solids().sort_by_distance((22.146732, -6.457987, -40.69))[0], mode=Mode.SUBTRACT)
    add(cut_extrude_5_tool2.solids().sort_by_distance((26.446732, -10.757987, -40.69))[0], mode=Mode.SUBTRACT)
    add(cut_extrude_5_tool3.solids().sort_by_distance((17.846732, -2.157987, -40.69))[0], mode=Mode.SUBTRACT)
    add(cut_extrude_5_tool4.solids().sort_by_distance((13.846732, 1.842013, -40.69))[0], mode=Mode.SUBTRACT)
    add(cut_extrude_5_tool5.solids().sort_by_distance((30.446732, -14.757987, -40.69))[0], mode=Mode.SUBTRACT)


solid = part.part
